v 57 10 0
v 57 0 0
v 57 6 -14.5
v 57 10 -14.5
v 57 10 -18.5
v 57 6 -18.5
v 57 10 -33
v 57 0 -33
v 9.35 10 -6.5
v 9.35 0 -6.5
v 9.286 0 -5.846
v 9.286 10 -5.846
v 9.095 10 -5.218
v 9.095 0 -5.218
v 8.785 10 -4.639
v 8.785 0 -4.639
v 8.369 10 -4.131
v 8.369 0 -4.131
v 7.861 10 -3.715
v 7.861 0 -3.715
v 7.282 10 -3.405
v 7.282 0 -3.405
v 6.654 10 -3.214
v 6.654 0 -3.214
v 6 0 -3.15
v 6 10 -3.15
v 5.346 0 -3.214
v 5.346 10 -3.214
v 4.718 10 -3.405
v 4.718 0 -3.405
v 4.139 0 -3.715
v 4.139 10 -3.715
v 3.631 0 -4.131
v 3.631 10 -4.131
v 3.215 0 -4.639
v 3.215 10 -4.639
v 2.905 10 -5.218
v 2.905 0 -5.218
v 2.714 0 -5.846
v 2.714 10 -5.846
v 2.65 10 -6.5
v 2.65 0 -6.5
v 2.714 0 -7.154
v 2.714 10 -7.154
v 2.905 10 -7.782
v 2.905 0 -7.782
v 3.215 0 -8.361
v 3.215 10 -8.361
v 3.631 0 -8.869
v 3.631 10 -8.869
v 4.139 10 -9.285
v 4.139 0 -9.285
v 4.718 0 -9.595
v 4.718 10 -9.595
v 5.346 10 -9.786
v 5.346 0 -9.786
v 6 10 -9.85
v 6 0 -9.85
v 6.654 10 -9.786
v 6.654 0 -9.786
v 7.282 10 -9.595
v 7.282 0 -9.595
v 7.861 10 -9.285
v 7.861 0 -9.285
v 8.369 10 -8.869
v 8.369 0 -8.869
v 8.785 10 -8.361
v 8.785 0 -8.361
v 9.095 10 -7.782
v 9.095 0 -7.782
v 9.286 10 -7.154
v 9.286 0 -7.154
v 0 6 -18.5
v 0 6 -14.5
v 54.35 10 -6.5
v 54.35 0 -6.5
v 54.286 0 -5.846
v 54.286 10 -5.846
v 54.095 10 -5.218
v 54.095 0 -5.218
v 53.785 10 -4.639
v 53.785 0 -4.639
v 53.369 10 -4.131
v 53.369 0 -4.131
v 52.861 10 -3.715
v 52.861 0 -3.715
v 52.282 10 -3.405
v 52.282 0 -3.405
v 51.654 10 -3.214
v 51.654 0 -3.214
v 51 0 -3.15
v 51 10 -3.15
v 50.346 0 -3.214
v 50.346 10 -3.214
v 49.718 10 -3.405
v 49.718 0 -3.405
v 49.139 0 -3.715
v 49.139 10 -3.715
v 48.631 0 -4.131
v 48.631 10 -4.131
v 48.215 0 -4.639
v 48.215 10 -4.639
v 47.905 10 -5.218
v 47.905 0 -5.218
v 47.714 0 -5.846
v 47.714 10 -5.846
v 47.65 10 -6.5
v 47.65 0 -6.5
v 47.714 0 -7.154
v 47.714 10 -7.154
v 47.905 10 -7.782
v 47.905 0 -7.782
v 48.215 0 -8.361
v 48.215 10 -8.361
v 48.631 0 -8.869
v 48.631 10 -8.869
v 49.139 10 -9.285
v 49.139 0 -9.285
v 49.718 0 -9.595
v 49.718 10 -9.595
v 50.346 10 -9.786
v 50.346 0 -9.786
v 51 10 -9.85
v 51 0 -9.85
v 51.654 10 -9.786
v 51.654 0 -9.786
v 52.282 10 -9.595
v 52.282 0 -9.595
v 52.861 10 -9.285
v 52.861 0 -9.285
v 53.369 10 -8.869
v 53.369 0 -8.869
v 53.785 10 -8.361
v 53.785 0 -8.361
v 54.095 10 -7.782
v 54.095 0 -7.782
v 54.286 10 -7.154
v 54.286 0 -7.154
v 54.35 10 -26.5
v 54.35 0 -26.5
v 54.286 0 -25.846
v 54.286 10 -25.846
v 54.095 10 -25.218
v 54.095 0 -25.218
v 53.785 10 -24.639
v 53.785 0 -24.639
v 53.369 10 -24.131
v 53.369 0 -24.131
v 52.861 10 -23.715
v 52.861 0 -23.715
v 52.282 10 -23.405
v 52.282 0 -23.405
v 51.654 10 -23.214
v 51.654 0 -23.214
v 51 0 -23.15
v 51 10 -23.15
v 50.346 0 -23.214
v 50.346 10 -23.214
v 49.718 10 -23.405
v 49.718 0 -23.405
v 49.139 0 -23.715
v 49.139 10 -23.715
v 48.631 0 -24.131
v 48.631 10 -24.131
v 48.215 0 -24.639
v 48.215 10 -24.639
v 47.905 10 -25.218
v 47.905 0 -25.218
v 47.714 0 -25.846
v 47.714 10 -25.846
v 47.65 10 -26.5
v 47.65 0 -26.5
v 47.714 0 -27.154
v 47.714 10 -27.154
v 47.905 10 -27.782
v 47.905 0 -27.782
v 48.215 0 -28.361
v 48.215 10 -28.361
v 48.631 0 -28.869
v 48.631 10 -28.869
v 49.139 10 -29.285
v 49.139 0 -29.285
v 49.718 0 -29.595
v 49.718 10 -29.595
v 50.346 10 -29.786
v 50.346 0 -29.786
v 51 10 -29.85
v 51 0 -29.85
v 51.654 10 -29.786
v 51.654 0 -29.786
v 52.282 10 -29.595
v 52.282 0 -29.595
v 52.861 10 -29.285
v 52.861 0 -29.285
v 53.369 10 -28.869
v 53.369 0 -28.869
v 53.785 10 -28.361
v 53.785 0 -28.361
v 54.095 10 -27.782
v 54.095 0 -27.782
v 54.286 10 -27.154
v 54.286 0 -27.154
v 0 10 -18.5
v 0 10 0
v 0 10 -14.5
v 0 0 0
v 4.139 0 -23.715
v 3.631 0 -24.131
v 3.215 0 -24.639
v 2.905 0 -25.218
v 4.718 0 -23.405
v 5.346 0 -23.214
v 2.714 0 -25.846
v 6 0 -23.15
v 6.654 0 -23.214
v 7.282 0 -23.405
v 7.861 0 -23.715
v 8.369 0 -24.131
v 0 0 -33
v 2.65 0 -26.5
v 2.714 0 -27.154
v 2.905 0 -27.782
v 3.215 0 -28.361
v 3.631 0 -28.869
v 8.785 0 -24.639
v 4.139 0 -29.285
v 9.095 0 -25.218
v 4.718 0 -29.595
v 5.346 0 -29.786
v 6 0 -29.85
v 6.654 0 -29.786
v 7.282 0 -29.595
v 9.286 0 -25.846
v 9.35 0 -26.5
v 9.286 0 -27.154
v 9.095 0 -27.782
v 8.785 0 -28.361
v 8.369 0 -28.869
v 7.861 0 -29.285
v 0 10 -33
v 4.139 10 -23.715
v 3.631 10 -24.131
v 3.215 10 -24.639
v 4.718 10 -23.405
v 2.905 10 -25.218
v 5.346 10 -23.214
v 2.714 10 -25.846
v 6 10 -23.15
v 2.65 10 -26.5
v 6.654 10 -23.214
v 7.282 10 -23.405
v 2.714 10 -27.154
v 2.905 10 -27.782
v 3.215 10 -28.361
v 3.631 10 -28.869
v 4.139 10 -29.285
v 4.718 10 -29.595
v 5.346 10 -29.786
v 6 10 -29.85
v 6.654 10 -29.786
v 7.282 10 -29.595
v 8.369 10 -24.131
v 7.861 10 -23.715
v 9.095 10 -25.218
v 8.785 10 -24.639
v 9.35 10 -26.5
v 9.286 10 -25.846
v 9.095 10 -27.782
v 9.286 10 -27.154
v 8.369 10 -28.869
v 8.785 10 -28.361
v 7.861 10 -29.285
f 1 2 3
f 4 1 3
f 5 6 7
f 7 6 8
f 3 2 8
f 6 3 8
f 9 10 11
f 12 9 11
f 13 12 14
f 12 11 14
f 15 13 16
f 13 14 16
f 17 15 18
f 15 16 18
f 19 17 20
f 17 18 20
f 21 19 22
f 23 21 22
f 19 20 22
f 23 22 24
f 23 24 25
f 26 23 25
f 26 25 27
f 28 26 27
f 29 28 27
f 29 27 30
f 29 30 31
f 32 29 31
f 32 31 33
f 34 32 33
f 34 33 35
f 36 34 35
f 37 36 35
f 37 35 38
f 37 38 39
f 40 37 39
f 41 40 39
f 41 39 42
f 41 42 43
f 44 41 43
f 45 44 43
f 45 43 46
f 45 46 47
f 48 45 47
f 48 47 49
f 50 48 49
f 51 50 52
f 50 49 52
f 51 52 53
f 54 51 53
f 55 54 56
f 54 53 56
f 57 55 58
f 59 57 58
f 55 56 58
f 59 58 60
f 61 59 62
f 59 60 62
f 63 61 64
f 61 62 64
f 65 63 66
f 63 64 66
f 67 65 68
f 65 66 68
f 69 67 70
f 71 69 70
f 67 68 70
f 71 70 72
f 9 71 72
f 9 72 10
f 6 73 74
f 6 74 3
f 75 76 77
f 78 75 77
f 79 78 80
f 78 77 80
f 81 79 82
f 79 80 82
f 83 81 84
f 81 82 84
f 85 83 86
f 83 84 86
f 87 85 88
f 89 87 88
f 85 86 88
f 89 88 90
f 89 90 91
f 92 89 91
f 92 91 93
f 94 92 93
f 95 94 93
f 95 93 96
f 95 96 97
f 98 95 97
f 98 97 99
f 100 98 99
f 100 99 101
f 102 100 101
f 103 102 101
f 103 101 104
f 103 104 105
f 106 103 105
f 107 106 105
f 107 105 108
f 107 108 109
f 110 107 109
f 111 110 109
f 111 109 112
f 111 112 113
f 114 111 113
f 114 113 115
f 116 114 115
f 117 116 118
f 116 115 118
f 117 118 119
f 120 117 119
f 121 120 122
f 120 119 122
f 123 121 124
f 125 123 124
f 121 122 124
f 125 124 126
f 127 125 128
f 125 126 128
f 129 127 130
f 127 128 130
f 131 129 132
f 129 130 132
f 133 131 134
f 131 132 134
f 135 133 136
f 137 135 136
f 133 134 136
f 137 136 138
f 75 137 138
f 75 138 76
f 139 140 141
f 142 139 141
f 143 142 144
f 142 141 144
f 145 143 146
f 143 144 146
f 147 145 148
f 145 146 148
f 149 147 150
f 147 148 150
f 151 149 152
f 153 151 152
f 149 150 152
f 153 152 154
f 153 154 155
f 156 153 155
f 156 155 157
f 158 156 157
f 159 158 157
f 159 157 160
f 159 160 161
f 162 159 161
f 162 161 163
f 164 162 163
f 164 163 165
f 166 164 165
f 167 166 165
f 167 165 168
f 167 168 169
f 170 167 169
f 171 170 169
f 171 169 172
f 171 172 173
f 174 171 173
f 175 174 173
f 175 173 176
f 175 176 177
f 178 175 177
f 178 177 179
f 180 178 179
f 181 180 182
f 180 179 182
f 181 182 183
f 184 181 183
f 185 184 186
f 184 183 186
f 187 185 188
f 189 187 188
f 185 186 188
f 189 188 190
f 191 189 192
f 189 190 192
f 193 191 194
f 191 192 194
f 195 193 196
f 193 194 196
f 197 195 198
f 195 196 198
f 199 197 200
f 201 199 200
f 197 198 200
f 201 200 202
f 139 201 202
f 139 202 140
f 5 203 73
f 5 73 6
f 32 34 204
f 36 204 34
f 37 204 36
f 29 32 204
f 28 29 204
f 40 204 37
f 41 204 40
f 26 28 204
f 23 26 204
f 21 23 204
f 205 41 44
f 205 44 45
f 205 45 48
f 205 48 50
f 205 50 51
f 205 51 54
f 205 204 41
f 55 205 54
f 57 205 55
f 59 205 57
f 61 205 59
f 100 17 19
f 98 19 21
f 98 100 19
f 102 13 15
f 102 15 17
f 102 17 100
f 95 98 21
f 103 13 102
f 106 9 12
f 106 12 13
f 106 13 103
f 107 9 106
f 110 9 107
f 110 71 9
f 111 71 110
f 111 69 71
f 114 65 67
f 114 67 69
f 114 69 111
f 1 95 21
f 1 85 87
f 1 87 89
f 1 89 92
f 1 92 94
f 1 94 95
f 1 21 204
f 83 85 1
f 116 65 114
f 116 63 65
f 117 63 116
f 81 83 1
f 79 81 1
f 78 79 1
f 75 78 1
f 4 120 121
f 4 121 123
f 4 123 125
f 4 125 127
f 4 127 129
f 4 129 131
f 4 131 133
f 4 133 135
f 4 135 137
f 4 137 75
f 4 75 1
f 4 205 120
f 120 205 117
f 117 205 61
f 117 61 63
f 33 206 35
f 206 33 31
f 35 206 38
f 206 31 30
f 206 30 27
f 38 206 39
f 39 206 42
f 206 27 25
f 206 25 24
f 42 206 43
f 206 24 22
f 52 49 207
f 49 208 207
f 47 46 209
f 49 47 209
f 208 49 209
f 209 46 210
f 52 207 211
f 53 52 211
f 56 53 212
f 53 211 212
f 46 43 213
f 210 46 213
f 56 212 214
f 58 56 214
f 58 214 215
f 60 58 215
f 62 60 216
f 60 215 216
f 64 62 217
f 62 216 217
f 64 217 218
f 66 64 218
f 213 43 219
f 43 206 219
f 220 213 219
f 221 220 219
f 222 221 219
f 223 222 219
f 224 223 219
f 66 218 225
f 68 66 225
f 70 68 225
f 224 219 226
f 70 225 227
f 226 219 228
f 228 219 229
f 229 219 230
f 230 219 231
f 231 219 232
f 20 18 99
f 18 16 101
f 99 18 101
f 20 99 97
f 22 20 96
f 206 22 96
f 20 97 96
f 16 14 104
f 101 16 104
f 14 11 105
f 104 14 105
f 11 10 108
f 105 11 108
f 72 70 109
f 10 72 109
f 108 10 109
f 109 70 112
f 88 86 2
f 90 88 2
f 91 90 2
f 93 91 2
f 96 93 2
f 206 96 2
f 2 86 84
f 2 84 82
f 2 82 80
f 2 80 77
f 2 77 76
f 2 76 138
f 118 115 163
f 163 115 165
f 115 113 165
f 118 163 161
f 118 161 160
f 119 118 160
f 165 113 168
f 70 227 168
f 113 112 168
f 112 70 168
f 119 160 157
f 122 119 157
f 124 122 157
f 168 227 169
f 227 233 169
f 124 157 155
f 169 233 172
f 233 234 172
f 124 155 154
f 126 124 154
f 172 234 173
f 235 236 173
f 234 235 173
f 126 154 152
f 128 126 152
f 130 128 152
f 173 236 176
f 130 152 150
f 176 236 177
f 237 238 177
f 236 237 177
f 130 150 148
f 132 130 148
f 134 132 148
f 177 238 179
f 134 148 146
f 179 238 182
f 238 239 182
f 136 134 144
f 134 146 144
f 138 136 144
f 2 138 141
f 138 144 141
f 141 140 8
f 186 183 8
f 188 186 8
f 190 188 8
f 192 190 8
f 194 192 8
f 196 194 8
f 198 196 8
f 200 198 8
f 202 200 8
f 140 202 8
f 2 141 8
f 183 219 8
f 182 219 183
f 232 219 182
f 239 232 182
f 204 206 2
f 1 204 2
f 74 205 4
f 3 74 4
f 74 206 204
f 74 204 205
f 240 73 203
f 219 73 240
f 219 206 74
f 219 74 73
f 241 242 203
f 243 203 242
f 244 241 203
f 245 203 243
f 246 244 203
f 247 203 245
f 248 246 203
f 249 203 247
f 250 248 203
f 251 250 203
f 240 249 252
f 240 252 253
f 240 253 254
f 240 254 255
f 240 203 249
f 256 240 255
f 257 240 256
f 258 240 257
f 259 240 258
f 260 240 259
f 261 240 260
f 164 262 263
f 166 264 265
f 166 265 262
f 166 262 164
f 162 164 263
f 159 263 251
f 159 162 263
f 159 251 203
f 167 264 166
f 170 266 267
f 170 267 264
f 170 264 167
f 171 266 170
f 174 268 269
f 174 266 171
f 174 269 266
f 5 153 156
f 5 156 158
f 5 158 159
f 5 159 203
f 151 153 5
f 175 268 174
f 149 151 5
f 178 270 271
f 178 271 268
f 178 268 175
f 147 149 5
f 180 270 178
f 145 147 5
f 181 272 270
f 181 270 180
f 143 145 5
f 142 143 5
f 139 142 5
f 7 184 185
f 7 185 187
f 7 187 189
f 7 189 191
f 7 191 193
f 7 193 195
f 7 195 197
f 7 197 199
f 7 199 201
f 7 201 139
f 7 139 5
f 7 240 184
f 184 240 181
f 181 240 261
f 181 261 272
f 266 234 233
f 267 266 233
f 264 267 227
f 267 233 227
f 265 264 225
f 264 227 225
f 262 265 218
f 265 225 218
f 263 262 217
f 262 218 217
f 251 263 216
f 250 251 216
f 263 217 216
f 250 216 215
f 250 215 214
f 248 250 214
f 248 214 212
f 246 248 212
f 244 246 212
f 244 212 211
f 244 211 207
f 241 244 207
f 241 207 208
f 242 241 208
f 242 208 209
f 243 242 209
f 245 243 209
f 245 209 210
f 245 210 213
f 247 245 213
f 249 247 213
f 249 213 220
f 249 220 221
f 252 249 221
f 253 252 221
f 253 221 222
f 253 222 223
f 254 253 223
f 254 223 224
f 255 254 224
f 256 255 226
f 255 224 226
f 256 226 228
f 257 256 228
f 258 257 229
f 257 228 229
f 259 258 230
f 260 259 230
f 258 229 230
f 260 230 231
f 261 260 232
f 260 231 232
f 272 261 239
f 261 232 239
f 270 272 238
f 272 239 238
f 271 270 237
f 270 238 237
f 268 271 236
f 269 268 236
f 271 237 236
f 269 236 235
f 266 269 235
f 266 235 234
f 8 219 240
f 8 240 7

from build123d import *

# Parameters (mm, degrees)
SKETCH1_W           = 57
SKETCH1_H           = 33
BOSS_EXTRUDE1_DEPTH = 10
SKETCH3_R           = 3.35
CUT_EXTRUDE1_DEPTH  = 11
SKETCH4_R           = 3.35
CUT_EXTRUDE2_DEPTH  = 11
SKETCH10_R          = 3.35
CUT_EXTRUDE5_DEPTH  = 11
SKETCH12_R          = 3.35
CUT_EXTRUDE6_DEPTH  = 11
SKETCH16_W          = 57
SKETCH16_H          = 4
CUT_EXTRUDE7_DEPTH  = 4


with BuildPart() as part:
    # Sketch1 → Boss-Extrude1 (new body)
    with BuildSketch(Plane(origin=(0, 0, 0), x_dir=(1, 0, 0), z_dir=(0, 1, 0))):
        with Locations((28.5, 16.5)):
            Rectangle(SKETCH1_W, SKETCH1_H)
    extrude(amount=BOSS_EXTRUDE1_DEPTH)

    # Sketch3 → Cut-Extrude1 (cut, through all)
    with BuildSketch(Plane.XZ):
        with Locations((6, -6.5)):
            Circle(SKETCH3_R)
    extrude(amount=-CUT_EXTRUDE1_DEPTH, mode=Mode.SUBTRACT)

    # Sketch4 → Cut-Extrude2 (cut, through all)
    with BuildSketch(Plane.XZ):
        with Locations((51, -26.5)):
            Circle(SKETCH4_R)
    extrude(amount=-CUT_EXTRUDE2_DEPTH, mode=Mode.SUBTRACT)

    # Sketch10 → Cut-Extrude5 (cut, through all)
    with BuildSketch(Plane.XZ):
        with Locations((6, -26.5)):
            Circle(SKETCH10_R)
    extrude(amount=-CUT_EXTRUDE5_DEPTH, mode=Mode.SUBTRACT)

    # Sketch12 → Cut-Extrude6 (cut, through all)
    with BuildSketch(Plane.XZ):
        with Locations((51, -6.5)):
            Circle(SKETCH12_R)
    extrude(amount=-CUT_EXTRUDE6_DEPTH, mode=Mode.SUBTRACT)

    # Sketch16 → Cut-Extrude7 (cut)
    with BuildSketch(Plane(origin=(0, 10, 0), x_dir=(1, 0, 0), z_dir=(0, 1, 0))):
        with Locations((28.5, 16.5)):
            Rectangle(SKETCH16_W, SKETCH16_H)
    extrude(amount=-CUT_EXTRUDE7_DEPTH, mode=Mode.SUBTRACT)


solid = part.part
